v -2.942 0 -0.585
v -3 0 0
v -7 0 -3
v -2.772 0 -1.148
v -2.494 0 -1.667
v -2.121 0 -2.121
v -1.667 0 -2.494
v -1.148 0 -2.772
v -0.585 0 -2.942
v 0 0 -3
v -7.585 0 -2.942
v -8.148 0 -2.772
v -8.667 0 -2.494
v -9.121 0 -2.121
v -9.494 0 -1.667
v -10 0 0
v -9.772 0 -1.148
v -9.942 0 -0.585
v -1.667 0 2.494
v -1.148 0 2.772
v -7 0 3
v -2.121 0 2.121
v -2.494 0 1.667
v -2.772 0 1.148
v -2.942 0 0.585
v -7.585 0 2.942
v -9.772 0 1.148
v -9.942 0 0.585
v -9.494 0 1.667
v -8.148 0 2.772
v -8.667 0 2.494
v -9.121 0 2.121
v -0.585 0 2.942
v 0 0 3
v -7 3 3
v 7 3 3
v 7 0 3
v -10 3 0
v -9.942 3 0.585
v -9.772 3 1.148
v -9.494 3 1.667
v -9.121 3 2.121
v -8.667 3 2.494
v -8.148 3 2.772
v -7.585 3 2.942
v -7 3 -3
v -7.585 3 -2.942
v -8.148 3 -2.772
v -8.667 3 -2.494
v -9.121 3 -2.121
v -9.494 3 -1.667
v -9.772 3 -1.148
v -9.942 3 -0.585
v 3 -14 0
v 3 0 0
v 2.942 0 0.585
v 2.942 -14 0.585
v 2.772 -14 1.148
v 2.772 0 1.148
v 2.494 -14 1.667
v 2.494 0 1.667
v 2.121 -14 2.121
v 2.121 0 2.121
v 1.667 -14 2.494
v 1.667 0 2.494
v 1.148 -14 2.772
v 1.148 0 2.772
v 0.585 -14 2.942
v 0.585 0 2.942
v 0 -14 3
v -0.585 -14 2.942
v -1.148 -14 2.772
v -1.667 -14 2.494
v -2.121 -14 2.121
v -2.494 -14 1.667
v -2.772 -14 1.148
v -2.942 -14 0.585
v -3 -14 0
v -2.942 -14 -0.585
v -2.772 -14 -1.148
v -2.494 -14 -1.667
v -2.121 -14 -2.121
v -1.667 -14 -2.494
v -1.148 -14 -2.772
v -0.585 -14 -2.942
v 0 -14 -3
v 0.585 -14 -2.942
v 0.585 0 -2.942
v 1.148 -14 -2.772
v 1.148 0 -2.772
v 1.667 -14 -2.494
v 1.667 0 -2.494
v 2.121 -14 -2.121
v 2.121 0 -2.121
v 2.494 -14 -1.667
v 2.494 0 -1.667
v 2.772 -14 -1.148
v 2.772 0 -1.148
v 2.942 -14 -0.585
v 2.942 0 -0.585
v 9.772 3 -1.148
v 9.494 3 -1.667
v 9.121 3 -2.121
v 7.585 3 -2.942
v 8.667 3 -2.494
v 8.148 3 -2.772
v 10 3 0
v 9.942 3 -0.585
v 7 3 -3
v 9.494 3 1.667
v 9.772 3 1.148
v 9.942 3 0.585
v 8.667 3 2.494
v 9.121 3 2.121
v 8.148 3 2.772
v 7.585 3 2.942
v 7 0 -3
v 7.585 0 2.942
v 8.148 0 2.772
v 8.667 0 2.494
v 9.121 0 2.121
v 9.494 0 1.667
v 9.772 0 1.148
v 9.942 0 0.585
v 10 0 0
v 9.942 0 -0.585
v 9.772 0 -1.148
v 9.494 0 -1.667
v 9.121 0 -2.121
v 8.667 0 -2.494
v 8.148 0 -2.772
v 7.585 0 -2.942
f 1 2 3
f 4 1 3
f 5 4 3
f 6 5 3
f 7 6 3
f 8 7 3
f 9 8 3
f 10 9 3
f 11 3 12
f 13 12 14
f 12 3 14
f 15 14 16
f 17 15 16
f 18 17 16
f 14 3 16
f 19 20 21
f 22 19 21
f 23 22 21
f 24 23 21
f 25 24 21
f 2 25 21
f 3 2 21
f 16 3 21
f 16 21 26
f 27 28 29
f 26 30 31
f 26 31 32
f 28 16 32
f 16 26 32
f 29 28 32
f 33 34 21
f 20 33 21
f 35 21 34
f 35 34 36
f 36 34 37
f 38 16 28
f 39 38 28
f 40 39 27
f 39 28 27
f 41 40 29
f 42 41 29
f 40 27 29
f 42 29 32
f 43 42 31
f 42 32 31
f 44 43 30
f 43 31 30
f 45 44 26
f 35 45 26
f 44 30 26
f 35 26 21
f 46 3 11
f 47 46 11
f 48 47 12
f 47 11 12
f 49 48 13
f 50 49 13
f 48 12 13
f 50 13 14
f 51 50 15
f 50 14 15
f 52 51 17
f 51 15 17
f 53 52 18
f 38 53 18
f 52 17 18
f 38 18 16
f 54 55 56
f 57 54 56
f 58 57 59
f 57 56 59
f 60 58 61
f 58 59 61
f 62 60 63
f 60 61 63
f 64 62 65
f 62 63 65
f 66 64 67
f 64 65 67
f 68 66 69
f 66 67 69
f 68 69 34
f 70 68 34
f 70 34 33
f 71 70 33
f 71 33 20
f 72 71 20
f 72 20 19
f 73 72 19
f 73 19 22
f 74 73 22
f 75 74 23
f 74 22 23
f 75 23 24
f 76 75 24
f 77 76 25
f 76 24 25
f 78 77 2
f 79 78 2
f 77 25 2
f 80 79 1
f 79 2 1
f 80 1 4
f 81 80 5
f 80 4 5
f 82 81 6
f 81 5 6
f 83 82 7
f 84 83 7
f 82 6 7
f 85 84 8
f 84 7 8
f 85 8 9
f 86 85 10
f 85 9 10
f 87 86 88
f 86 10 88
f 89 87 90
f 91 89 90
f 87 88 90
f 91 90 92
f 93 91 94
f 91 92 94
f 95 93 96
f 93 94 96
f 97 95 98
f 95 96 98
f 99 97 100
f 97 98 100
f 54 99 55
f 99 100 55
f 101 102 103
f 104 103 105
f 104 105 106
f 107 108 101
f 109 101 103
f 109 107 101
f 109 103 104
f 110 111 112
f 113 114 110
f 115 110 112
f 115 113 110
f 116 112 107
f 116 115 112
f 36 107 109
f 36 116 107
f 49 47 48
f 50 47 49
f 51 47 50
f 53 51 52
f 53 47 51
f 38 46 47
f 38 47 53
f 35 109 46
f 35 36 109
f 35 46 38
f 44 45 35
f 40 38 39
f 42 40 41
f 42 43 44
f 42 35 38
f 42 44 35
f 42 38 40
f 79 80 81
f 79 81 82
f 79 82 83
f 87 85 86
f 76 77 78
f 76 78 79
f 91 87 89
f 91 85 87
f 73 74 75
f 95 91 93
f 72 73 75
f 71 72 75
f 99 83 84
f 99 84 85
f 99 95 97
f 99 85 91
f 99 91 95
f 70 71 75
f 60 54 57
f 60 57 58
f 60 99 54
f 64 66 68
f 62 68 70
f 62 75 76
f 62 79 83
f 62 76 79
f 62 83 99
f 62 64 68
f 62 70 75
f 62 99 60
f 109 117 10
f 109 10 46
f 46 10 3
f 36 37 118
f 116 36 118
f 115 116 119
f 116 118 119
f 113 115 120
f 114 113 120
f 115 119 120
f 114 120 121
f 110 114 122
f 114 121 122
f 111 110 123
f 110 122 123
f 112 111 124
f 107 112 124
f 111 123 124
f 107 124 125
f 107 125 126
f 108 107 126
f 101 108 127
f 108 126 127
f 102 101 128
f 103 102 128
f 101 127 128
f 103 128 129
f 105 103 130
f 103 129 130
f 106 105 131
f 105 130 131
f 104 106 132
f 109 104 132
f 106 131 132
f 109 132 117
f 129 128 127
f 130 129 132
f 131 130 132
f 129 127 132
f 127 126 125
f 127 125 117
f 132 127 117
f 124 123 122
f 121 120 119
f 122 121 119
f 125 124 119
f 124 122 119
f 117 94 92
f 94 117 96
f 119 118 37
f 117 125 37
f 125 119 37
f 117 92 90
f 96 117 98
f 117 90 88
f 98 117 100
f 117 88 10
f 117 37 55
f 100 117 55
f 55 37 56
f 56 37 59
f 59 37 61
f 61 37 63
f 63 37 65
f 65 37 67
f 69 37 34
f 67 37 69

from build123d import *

# Parameters (mm, degrees)
F0_R     = 3
F1_DEPTH = 14
F3_DEPTH = 3


with BuildPart() as f1:
    # F0 (on Front) → F1 (new body)
    with BuildSketch(Plane.XZ):
        Circle(F0_R)
    extrude(amount=F1_DEPTH)

    # F2 (on face) → F3 (join)
    with BuildSketch(Plane(origin=(0, 0, 0), x_dir=(-1, 0, 0), z_dir=(0, 1, 0))):
        with BuildLine():
            ThreePointArc((-10, 0), (-9.1213203436, -2.1213203436), (-7, -3))
            Line((-7, -3), (0, -3))
            ThreePointArc((0, -3), (-3, 0), (0, 3))
            Line((0, 3), (-7, 3))
            ThreePointArc((-7, 3), (-9.1213203436, 2.1213203436), (-10, 0))
        make_face()
        with BuildLine():
            ThreePointArc((3, 0), (2.1213203436, -2.1213203436), (0, -3))
            Line((0, -3), (7, -3))
            ThreePointArc((7, -3), (9.1213203436, -2.1213203436), (10, 0))
            ThreePointArc((10, 0), (9.1213203436, 2.1213203436), (7, 3))
            Line((7, 3), (0, 3))
            ThreePointArc((0, 3), (2.1213203436, 2.1213203436), (3, 0))
        make_face()
        with BuildLine():
            ThreePointArc((0, 3), (-3, 0), (0, -3))
            ThreePointArc((0, -3), (2.1213203436, -2.1213203436), (3, 0))
            ThreePointArc((3, 0), (2.1213203436, 2.1213203436), (0, 3))
        make_face()
    extrude(amount=F3_DEPTH)


solid = f1.part
